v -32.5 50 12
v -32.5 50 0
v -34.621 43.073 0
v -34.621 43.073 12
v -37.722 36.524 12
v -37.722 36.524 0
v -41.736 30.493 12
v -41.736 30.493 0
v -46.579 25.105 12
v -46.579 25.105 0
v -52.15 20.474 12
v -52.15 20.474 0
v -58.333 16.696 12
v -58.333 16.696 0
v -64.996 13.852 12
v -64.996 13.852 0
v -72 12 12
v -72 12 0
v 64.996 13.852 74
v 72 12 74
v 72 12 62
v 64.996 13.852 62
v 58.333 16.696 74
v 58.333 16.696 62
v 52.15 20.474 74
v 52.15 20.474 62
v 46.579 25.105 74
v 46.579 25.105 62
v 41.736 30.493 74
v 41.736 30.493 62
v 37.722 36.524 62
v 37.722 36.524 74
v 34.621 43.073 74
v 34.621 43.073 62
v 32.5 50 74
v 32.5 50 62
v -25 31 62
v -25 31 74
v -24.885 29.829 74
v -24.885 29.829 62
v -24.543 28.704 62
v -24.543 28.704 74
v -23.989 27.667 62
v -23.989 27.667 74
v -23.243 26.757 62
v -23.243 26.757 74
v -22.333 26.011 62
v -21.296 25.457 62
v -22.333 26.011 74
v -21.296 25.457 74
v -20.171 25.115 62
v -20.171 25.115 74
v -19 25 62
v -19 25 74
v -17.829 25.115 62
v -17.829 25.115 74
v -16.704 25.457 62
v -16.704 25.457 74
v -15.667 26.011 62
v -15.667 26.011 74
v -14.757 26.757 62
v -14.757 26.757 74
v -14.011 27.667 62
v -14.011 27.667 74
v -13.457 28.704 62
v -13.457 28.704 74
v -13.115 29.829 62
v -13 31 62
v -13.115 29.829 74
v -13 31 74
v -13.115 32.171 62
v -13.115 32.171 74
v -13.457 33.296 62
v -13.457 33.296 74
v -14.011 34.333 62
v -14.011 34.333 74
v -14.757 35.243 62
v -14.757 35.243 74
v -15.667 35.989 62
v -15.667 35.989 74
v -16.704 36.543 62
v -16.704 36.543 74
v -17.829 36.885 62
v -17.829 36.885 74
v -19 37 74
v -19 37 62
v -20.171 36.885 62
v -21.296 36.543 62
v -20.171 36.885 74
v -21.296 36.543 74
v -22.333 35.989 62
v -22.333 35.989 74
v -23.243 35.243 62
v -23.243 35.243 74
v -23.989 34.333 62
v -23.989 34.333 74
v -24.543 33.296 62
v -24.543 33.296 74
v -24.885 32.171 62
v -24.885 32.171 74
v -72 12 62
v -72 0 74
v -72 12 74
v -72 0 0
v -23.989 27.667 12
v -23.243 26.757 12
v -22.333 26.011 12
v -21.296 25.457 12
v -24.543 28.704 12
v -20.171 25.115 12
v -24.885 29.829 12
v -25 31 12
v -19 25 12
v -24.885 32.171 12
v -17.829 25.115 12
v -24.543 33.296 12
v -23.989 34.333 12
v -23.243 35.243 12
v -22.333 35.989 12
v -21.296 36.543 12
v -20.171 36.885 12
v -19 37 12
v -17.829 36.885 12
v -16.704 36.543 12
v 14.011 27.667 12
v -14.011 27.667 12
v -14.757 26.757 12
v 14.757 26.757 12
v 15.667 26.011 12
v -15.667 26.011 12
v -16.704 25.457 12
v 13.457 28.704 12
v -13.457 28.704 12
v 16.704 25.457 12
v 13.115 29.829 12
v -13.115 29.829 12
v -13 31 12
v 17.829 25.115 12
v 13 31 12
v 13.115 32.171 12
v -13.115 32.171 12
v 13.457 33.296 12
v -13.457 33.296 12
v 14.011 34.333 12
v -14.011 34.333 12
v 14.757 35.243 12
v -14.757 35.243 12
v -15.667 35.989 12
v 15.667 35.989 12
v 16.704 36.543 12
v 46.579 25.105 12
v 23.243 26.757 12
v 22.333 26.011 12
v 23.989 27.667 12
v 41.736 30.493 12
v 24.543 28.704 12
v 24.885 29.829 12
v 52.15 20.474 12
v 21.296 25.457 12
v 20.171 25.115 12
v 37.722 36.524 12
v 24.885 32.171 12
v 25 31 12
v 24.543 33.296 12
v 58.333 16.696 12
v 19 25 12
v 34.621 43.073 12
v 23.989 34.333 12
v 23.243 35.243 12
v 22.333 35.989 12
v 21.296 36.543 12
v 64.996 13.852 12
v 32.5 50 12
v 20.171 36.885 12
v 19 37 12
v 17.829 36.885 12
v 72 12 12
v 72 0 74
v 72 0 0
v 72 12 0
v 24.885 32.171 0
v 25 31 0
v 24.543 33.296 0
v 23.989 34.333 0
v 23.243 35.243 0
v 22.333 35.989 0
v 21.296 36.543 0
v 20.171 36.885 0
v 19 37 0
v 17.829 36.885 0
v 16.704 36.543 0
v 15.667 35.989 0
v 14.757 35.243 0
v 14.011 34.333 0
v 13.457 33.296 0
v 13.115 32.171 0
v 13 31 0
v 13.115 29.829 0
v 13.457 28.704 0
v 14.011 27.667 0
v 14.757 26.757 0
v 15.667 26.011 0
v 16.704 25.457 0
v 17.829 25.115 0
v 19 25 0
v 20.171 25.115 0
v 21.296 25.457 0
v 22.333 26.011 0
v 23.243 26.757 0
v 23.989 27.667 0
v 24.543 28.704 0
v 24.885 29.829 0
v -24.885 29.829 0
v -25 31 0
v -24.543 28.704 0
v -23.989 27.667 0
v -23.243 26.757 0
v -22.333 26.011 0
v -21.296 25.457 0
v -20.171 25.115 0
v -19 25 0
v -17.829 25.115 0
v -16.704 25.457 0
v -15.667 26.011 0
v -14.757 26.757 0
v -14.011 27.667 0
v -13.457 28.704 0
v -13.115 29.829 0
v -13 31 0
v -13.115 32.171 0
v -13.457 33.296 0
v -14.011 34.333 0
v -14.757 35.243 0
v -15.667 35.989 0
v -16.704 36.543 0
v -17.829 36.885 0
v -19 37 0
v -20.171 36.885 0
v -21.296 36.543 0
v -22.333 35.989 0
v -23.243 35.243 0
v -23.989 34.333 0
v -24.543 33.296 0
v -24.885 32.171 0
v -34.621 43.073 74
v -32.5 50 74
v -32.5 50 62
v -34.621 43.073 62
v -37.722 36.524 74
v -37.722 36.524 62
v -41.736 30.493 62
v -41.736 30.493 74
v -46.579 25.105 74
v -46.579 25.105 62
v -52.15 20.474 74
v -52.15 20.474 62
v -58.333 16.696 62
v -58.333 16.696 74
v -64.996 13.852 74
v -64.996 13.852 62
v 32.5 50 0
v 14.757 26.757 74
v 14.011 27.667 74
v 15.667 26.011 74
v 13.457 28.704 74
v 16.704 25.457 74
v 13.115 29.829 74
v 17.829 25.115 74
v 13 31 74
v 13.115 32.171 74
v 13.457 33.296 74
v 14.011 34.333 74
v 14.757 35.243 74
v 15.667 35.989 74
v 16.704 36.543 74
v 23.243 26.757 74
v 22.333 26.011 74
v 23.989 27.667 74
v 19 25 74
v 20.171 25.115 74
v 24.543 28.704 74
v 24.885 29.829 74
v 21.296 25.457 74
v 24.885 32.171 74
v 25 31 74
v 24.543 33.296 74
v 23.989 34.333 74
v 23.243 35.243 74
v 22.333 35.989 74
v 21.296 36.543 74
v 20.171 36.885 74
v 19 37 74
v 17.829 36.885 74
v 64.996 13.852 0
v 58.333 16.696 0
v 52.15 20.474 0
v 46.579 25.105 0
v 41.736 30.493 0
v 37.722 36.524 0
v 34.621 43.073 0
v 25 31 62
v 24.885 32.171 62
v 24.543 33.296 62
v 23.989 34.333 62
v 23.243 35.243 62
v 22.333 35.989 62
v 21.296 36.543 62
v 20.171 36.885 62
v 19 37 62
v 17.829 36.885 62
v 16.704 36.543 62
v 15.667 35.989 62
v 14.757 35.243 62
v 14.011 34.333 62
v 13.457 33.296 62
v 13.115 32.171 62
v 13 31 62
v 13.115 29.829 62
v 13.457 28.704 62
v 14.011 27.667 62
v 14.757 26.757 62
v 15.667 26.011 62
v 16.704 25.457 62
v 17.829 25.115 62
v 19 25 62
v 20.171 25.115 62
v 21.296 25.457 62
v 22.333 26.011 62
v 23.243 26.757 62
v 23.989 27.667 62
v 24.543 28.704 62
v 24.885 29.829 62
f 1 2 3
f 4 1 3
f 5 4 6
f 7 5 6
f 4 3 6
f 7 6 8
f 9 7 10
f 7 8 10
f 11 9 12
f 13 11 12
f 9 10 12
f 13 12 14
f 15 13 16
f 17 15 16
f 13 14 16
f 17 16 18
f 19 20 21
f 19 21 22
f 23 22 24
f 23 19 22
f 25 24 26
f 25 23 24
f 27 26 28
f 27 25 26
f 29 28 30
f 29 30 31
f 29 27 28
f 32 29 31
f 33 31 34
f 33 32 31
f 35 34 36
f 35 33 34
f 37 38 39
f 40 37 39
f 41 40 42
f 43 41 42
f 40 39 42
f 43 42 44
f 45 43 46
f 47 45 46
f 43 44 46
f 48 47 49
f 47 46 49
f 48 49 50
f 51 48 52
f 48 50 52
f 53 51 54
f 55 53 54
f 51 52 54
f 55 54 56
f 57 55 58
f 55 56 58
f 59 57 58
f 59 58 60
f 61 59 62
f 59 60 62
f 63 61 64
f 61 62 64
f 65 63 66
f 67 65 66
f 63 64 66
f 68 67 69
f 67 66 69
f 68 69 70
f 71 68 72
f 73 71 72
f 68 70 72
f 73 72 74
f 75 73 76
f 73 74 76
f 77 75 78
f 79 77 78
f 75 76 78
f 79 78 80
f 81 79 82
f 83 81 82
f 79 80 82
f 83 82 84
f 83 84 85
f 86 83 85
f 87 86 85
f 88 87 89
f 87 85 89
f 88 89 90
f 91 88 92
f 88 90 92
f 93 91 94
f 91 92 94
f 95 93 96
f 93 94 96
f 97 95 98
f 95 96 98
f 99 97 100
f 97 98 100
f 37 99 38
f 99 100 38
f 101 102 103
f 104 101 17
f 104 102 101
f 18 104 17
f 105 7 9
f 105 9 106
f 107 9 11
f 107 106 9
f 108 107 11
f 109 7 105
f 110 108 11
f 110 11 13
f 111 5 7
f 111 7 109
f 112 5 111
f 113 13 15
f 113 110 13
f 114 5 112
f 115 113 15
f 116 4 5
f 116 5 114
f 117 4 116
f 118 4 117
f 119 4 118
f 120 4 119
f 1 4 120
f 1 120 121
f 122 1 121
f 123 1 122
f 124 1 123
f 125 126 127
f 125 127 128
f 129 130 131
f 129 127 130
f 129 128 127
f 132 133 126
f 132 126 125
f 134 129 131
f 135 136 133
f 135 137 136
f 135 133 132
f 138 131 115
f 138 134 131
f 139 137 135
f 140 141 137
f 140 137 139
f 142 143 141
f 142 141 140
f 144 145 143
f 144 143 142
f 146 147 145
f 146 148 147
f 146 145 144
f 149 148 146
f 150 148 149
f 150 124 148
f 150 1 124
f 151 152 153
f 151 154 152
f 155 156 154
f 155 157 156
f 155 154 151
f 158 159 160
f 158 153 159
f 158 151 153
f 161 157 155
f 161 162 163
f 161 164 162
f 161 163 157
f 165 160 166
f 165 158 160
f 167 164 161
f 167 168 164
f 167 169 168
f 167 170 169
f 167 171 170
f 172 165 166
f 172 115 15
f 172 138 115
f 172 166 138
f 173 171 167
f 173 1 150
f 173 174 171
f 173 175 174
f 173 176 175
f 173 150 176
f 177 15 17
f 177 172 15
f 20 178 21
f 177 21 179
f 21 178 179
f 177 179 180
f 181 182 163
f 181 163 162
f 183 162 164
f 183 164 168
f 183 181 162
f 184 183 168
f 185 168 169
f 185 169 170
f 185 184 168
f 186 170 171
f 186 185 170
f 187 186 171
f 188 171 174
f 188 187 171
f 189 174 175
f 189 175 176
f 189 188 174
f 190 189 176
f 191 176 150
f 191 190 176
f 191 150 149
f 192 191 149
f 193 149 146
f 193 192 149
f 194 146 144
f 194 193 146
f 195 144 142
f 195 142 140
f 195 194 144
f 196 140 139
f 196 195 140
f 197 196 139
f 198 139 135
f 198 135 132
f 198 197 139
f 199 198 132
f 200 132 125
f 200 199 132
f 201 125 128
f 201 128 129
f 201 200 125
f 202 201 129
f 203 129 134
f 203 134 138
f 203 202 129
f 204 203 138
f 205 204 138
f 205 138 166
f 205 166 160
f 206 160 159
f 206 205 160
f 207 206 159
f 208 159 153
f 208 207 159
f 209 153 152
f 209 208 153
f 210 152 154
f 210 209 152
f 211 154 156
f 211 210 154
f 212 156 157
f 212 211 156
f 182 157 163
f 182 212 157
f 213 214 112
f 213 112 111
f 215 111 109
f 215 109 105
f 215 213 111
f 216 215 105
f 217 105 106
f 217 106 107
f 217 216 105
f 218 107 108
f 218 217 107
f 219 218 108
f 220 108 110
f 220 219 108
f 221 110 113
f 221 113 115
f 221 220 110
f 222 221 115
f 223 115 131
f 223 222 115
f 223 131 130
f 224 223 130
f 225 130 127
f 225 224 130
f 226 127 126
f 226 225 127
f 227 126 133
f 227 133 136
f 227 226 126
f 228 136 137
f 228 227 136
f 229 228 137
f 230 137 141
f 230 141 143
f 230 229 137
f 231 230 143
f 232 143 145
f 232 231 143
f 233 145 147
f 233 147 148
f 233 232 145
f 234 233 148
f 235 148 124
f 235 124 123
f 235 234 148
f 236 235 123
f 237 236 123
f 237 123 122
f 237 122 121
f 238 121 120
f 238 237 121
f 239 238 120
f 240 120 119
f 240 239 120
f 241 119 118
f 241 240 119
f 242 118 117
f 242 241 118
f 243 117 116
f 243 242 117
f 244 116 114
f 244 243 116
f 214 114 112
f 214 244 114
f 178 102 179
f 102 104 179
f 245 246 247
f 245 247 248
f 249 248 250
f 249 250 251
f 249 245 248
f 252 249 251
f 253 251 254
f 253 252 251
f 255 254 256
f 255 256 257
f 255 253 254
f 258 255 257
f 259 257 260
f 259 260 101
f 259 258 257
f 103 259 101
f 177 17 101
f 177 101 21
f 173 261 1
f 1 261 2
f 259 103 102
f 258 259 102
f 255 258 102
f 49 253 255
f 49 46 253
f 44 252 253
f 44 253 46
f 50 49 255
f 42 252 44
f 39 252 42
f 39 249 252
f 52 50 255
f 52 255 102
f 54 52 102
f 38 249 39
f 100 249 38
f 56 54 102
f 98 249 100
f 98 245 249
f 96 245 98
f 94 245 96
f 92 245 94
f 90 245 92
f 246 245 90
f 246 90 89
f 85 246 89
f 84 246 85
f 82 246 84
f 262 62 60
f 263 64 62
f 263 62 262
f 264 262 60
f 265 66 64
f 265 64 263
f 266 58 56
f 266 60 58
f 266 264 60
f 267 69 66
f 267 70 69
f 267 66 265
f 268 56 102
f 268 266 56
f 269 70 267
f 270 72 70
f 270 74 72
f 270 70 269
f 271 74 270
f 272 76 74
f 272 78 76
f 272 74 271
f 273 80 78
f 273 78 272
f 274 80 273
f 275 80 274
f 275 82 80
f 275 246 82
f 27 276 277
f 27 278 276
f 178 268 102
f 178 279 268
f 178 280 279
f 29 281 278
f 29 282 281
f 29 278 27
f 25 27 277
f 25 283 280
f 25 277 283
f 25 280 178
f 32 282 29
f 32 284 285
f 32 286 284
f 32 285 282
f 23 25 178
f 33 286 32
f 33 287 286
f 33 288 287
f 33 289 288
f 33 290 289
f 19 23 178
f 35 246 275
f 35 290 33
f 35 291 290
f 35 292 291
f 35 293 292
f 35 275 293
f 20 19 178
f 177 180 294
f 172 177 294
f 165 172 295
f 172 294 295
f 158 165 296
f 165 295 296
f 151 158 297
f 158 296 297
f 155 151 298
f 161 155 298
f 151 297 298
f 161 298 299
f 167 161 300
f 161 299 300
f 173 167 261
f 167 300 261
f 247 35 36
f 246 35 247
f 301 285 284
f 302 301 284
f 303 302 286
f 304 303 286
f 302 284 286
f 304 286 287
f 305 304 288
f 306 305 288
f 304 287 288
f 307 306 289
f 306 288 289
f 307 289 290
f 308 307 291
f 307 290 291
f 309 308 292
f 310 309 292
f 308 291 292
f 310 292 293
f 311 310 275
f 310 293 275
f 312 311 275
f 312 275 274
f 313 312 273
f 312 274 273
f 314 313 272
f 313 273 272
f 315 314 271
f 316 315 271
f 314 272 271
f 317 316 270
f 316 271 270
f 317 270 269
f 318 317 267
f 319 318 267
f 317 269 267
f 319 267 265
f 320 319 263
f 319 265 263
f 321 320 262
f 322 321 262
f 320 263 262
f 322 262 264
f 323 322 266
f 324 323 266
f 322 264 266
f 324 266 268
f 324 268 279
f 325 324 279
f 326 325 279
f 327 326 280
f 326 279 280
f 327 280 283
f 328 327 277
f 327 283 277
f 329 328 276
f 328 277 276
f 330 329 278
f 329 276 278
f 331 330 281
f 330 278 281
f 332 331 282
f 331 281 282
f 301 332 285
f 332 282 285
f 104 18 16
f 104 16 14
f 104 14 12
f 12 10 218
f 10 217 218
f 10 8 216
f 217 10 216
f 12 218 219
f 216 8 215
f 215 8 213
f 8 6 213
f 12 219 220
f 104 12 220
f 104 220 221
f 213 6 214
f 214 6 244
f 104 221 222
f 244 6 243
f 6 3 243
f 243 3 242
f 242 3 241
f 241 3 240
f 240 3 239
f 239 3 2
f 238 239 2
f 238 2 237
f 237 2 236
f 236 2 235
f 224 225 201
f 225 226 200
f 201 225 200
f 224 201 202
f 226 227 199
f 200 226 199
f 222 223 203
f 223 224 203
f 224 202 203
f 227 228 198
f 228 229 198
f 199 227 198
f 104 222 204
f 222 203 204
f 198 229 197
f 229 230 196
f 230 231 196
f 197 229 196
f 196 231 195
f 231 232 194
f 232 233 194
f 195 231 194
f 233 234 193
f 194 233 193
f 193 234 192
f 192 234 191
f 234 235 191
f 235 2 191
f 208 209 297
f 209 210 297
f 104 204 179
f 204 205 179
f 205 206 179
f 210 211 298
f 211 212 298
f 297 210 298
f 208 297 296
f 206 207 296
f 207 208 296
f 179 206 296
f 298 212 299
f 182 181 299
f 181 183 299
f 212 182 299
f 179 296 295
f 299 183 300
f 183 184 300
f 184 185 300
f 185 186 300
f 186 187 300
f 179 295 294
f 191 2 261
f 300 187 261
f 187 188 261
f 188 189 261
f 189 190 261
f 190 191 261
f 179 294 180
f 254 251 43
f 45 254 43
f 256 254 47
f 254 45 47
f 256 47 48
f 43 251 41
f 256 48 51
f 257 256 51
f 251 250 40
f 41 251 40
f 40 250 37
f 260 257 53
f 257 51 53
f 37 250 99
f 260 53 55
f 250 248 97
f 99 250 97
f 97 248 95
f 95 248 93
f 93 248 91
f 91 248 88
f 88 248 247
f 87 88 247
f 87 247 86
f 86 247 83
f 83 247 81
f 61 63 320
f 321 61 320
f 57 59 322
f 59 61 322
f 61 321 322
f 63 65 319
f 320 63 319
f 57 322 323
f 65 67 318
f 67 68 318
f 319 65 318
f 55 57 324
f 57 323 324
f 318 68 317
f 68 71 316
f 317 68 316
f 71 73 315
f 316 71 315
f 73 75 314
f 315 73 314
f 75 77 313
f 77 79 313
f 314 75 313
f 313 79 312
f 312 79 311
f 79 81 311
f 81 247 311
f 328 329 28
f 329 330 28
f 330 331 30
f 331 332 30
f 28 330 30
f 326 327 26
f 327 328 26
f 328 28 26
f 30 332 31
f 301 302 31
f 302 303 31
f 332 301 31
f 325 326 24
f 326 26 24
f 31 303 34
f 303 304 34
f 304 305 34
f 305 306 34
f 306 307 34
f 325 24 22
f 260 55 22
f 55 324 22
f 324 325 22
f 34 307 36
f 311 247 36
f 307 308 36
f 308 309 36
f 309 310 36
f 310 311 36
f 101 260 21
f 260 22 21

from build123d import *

# Parameters (mm, degrees)
SKETCH1_R           = 6
BOSS_EXTRUDE1_DEPTH = 12
BOSS_EXTRUDE2_START = -25
SKETCH2_W           = 144
SKETCH2_H           = 12
BOSS_EXTRUDE2_DEPTH = 50


with BuildPart() as part:
    # Sketch1 → Boss-Extrude1 (new body)
    with BuildSketch(Plane.XY):
        with BuildLine():
            Line((-72, 0), (72, 0))
            Line((72, 0), (72, 12))
            ThreePointArc((72, 12), (46.579087682, 25.10523588), (32.5, 50))
            Line((32.5, 50), (-32.5, 50))
            ThreePointArc((-32.5, 50), (-46.579087682, 25.10523588), (-72, 12))
            Line((-72, 12), (-72, 0))
        make_face()
        with Locations((19, 31)):
            Circle(SKETCH1_R, mode=Mode.SUBTRACT)
        with Locations(Location((-19, 31, 0), (0, 0, 180))):
            Circle(SKETCH1_R, mode=Mode.SUBTRACT)
    extrude(amount=BOSS_EXTRUDE1_DEPTH)


with BuildPart() as body_2:
    # Mirror2: mirrored copy
    add(part.part.mirror(Plane.XY.offset(37)))


with BuildPart() as part_1:
    add(part.part)

    add(body_2.part)  # Boss-Extrude2 merges body 2
    # Sketch2 → Boss-Extrude2 (add)
    with BuildSketch(Plane.XY.offset(37).offset(BOSS_EXTRUDE2_START)):
        with Locations((0, 6)):
            Rectangle(SKETCH2_W, SKETCH2_H)
    extrude(amount=BOSS_EXTRUDE2_DEPTH)


solid = part_1.part
